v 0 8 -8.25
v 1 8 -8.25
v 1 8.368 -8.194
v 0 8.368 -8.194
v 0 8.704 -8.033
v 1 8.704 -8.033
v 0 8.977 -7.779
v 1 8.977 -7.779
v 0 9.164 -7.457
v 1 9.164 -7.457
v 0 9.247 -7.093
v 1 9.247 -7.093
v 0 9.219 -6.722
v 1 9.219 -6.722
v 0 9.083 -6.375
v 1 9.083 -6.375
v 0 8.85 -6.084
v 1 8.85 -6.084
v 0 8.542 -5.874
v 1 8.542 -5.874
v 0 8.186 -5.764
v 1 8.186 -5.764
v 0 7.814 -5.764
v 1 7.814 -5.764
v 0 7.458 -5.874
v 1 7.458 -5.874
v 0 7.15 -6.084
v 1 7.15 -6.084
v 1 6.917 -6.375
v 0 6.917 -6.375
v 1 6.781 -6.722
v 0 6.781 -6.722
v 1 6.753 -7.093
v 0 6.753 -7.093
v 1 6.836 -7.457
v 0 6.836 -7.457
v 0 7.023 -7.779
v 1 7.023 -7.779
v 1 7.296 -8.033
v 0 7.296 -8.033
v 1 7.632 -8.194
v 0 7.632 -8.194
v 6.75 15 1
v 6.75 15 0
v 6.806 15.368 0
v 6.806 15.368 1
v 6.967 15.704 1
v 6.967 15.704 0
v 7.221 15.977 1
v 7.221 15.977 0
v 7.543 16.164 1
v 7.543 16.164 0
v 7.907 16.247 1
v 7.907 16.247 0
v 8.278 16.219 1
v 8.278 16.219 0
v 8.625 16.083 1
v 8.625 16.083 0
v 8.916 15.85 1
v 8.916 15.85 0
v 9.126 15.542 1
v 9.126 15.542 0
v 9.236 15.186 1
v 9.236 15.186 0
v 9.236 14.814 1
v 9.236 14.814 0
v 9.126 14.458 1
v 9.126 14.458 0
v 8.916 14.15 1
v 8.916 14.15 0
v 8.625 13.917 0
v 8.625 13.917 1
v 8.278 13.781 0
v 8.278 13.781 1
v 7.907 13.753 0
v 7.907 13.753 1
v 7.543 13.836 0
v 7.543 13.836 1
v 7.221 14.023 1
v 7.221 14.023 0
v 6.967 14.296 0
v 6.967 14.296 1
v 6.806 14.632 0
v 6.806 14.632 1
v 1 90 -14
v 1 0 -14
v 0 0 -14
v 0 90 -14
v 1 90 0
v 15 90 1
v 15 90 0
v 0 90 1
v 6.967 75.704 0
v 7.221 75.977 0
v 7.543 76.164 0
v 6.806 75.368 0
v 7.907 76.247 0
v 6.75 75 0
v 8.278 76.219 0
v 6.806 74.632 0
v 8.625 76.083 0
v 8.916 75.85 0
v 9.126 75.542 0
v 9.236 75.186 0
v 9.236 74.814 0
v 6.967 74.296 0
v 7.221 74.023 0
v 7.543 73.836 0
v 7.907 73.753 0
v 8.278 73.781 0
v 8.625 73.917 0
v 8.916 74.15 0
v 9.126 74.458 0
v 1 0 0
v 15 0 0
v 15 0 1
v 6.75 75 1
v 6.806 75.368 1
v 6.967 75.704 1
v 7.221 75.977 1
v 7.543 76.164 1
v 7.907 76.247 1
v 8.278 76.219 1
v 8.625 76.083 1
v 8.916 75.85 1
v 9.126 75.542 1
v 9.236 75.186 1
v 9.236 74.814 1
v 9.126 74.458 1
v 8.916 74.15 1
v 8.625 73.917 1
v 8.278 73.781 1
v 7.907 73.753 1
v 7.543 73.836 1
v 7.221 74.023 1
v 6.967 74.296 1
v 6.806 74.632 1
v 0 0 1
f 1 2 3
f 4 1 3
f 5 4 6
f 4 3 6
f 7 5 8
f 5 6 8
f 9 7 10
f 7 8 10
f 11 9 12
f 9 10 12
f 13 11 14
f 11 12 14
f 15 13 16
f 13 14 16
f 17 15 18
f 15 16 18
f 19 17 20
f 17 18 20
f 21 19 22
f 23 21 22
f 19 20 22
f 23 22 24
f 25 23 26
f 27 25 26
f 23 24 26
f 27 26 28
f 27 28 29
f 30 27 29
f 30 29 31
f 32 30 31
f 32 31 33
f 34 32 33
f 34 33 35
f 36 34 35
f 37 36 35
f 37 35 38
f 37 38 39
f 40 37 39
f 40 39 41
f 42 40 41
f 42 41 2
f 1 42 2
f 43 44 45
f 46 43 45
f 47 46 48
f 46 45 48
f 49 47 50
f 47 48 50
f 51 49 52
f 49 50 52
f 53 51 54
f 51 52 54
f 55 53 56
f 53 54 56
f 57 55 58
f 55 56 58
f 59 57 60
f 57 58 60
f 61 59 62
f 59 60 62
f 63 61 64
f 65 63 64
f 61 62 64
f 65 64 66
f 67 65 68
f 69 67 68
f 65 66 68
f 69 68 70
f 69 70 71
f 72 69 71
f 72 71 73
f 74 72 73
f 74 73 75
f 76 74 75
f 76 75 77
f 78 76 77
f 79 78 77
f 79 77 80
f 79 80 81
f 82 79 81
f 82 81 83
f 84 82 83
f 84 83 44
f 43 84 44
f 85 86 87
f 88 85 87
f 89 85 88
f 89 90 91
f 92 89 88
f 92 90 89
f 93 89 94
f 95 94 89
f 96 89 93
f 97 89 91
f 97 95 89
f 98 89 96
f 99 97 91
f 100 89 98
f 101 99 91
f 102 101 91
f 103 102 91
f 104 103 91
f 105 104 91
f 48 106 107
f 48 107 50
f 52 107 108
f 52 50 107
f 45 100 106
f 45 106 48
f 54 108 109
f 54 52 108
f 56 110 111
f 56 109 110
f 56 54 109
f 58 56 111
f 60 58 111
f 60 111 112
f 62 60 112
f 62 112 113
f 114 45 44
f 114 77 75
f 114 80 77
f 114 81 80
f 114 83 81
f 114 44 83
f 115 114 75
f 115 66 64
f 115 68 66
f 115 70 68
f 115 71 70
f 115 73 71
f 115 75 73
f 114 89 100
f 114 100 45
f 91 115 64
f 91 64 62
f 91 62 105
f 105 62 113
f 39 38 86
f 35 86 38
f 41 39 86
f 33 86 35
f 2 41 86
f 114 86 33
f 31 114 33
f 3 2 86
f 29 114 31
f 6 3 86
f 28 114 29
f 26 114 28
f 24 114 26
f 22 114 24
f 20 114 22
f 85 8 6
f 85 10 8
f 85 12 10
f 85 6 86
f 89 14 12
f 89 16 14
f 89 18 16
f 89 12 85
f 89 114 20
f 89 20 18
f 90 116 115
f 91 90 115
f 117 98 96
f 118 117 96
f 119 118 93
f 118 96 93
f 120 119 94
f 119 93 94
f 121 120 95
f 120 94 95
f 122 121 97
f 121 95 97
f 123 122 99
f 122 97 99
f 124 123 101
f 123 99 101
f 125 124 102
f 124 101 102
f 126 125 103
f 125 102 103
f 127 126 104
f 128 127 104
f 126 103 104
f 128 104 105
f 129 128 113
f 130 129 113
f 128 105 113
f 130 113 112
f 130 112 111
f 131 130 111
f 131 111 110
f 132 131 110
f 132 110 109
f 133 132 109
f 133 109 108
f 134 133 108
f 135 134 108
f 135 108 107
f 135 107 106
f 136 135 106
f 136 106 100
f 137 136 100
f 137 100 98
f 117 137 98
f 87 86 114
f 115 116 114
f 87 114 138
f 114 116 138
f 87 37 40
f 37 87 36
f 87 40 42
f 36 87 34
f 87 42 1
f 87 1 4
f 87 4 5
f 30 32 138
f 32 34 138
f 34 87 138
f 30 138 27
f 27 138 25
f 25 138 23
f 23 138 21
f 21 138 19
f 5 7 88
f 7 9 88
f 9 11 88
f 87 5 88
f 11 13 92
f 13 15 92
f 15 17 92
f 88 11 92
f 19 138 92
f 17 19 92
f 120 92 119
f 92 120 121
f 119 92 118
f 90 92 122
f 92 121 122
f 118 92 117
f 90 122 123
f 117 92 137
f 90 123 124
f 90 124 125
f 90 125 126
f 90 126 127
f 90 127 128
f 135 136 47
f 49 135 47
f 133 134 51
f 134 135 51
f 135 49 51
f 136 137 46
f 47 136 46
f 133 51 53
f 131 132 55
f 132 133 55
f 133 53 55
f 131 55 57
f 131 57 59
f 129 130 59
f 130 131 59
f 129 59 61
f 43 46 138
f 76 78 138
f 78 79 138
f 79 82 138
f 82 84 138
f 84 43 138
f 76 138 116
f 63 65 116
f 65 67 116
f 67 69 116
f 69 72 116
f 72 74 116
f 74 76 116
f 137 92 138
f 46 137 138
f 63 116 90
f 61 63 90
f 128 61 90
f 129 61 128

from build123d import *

# Parameters (mm, degrees)
SKETCH_1_W      = 15
SKETCH_1_H      = 1
EXTRUDE_1_DEPTH = 90
SKETCH_3_W      = 1
SKETCH_3_H      = 90
EXTRUDE_2_DEPTH = 14
M3X0_5_1_D      = 2.5
M3X0_5_2_D      = 2.5


with BuildPart() as part:
    # ｽｹｯﾁ1 → ﾎﾞｽ - 押し出し1 (new body)
    with BuildSketch(Plane(origin=(0, 0, 0), x_dir=(1, 0, 0), z_dir=(0, 1, 0))):
        with Locations((7.5, -0.5)):
            Rectangle(SKETCH_1_W, SKETCH_1_H)
    extrude(amount=EXTRUDE_1_DEPTH)

    # ｽｹｯﾁ3 → ﾎﾞｽ - 押し出し2 (add)
    with BuildSketch(Plane(origin=(0, 0, 0), x_dir=(-1, 0, 0), z_dir=(0, 0, -1))):
        with Locations((-0.5, 45)):
            Rectangle(SKETCH_3_W, SKETCH_3_H)
    extrude(amount=EXTRUDE_2_DEPTH)

    # M3x0.5 ねじ穴1 (through all)
    with Locations(Plane.XY.offset(1)):
        with Locations((8, 15), (8, 75)):
            Hole(M3X0_5_1_D / 2)

    # M3x0.5 ねじ穴2 (through all)
    with Locations(Plane.ZY):
        with Locations((-7, 8)):
            Hole(M3X0_5_2_D / 2)


solid = part.part
